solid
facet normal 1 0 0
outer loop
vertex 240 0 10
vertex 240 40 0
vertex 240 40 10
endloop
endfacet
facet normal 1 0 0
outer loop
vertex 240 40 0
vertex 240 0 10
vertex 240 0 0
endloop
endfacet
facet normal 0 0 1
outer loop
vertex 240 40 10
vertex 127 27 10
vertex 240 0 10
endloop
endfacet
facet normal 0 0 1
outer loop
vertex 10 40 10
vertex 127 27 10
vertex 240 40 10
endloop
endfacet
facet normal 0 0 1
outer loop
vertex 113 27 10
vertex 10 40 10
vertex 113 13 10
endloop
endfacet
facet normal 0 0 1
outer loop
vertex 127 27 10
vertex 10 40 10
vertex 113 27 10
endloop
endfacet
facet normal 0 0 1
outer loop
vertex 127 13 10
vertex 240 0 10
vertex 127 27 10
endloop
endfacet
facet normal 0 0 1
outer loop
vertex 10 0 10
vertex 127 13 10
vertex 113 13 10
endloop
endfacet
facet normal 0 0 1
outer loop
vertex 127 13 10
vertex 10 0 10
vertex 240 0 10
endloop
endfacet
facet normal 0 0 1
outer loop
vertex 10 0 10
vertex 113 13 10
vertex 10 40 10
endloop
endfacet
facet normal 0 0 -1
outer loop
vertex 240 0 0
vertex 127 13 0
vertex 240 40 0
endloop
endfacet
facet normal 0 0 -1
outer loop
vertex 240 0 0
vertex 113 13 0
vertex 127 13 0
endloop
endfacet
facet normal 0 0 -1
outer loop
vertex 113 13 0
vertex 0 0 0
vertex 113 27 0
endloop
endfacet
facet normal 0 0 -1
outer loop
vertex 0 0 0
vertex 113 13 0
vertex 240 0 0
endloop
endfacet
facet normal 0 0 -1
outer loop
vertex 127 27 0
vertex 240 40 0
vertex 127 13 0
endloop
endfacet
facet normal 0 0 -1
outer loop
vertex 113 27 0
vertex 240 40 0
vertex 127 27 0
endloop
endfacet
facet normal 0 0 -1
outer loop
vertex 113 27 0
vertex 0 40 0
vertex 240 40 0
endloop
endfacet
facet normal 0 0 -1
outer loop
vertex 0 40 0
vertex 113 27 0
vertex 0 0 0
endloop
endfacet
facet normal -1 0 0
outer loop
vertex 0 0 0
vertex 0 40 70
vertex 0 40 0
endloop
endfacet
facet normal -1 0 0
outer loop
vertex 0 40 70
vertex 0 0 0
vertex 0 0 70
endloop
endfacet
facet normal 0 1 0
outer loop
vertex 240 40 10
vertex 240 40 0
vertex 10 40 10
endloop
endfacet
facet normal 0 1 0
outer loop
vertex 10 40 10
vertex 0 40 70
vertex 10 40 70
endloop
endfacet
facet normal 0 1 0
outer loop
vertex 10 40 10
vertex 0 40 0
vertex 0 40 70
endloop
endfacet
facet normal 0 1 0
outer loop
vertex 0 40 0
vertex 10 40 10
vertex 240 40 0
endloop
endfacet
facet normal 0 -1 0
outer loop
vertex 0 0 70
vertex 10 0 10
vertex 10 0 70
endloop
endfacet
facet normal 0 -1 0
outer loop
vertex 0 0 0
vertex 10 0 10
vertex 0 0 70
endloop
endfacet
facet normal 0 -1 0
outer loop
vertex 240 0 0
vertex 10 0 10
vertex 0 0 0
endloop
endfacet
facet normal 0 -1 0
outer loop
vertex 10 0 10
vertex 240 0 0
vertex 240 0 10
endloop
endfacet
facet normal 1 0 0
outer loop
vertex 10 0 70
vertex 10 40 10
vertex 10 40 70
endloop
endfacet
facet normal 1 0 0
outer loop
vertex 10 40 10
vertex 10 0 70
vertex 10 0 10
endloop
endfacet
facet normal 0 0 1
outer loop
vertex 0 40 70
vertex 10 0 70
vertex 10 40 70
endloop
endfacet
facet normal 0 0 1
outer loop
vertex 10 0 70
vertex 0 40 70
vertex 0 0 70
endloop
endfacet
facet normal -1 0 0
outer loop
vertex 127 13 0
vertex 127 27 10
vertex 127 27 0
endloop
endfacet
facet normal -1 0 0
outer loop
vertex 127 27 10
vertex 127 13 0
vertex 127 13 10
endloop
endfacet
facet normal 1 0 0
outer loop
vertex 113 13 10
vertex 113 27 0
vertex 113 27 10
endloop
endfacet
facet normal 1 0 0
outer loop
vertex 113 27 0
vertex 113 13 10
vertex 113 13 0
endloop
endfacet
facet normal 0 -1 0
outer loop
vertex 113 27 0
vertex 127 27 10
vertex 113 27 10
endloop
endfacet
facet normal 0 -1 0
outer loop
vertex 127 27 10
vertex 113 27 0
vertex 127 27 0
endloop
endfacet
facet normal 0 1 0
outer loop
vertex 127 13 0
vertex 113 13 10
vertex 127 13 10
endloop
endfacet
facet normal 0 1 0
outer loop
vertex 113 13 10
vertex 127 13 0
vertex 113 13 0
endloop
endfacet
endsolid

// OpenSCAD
$fn = 32;

// ----------------------------------------------------------------------
// Gantry bracket: 200-250 mm L bracket
// ----------------------------------------------------------------------

// --- parameters (mm) ---
base_l = 240;             // base arm length, X
arm_w = 40;               // arm width, Y
thick = 10;               // arm thickness
up_h = 60;                // vertical arm height, Z
slot_w = 14;              // adjustment slot width in the base

total_h = up_h + thick;  // overall height

difference() {
  union() {
    cube([base_l, arm_w, thick]);
    cube([thick, arm_w, total_h]);
  }
  translate([base_l / 2 - slot_w / 2, arm_w / 2 - slot_w / 2, -1])
    cube([slot_w, slot_w, thick + 2]);
}
